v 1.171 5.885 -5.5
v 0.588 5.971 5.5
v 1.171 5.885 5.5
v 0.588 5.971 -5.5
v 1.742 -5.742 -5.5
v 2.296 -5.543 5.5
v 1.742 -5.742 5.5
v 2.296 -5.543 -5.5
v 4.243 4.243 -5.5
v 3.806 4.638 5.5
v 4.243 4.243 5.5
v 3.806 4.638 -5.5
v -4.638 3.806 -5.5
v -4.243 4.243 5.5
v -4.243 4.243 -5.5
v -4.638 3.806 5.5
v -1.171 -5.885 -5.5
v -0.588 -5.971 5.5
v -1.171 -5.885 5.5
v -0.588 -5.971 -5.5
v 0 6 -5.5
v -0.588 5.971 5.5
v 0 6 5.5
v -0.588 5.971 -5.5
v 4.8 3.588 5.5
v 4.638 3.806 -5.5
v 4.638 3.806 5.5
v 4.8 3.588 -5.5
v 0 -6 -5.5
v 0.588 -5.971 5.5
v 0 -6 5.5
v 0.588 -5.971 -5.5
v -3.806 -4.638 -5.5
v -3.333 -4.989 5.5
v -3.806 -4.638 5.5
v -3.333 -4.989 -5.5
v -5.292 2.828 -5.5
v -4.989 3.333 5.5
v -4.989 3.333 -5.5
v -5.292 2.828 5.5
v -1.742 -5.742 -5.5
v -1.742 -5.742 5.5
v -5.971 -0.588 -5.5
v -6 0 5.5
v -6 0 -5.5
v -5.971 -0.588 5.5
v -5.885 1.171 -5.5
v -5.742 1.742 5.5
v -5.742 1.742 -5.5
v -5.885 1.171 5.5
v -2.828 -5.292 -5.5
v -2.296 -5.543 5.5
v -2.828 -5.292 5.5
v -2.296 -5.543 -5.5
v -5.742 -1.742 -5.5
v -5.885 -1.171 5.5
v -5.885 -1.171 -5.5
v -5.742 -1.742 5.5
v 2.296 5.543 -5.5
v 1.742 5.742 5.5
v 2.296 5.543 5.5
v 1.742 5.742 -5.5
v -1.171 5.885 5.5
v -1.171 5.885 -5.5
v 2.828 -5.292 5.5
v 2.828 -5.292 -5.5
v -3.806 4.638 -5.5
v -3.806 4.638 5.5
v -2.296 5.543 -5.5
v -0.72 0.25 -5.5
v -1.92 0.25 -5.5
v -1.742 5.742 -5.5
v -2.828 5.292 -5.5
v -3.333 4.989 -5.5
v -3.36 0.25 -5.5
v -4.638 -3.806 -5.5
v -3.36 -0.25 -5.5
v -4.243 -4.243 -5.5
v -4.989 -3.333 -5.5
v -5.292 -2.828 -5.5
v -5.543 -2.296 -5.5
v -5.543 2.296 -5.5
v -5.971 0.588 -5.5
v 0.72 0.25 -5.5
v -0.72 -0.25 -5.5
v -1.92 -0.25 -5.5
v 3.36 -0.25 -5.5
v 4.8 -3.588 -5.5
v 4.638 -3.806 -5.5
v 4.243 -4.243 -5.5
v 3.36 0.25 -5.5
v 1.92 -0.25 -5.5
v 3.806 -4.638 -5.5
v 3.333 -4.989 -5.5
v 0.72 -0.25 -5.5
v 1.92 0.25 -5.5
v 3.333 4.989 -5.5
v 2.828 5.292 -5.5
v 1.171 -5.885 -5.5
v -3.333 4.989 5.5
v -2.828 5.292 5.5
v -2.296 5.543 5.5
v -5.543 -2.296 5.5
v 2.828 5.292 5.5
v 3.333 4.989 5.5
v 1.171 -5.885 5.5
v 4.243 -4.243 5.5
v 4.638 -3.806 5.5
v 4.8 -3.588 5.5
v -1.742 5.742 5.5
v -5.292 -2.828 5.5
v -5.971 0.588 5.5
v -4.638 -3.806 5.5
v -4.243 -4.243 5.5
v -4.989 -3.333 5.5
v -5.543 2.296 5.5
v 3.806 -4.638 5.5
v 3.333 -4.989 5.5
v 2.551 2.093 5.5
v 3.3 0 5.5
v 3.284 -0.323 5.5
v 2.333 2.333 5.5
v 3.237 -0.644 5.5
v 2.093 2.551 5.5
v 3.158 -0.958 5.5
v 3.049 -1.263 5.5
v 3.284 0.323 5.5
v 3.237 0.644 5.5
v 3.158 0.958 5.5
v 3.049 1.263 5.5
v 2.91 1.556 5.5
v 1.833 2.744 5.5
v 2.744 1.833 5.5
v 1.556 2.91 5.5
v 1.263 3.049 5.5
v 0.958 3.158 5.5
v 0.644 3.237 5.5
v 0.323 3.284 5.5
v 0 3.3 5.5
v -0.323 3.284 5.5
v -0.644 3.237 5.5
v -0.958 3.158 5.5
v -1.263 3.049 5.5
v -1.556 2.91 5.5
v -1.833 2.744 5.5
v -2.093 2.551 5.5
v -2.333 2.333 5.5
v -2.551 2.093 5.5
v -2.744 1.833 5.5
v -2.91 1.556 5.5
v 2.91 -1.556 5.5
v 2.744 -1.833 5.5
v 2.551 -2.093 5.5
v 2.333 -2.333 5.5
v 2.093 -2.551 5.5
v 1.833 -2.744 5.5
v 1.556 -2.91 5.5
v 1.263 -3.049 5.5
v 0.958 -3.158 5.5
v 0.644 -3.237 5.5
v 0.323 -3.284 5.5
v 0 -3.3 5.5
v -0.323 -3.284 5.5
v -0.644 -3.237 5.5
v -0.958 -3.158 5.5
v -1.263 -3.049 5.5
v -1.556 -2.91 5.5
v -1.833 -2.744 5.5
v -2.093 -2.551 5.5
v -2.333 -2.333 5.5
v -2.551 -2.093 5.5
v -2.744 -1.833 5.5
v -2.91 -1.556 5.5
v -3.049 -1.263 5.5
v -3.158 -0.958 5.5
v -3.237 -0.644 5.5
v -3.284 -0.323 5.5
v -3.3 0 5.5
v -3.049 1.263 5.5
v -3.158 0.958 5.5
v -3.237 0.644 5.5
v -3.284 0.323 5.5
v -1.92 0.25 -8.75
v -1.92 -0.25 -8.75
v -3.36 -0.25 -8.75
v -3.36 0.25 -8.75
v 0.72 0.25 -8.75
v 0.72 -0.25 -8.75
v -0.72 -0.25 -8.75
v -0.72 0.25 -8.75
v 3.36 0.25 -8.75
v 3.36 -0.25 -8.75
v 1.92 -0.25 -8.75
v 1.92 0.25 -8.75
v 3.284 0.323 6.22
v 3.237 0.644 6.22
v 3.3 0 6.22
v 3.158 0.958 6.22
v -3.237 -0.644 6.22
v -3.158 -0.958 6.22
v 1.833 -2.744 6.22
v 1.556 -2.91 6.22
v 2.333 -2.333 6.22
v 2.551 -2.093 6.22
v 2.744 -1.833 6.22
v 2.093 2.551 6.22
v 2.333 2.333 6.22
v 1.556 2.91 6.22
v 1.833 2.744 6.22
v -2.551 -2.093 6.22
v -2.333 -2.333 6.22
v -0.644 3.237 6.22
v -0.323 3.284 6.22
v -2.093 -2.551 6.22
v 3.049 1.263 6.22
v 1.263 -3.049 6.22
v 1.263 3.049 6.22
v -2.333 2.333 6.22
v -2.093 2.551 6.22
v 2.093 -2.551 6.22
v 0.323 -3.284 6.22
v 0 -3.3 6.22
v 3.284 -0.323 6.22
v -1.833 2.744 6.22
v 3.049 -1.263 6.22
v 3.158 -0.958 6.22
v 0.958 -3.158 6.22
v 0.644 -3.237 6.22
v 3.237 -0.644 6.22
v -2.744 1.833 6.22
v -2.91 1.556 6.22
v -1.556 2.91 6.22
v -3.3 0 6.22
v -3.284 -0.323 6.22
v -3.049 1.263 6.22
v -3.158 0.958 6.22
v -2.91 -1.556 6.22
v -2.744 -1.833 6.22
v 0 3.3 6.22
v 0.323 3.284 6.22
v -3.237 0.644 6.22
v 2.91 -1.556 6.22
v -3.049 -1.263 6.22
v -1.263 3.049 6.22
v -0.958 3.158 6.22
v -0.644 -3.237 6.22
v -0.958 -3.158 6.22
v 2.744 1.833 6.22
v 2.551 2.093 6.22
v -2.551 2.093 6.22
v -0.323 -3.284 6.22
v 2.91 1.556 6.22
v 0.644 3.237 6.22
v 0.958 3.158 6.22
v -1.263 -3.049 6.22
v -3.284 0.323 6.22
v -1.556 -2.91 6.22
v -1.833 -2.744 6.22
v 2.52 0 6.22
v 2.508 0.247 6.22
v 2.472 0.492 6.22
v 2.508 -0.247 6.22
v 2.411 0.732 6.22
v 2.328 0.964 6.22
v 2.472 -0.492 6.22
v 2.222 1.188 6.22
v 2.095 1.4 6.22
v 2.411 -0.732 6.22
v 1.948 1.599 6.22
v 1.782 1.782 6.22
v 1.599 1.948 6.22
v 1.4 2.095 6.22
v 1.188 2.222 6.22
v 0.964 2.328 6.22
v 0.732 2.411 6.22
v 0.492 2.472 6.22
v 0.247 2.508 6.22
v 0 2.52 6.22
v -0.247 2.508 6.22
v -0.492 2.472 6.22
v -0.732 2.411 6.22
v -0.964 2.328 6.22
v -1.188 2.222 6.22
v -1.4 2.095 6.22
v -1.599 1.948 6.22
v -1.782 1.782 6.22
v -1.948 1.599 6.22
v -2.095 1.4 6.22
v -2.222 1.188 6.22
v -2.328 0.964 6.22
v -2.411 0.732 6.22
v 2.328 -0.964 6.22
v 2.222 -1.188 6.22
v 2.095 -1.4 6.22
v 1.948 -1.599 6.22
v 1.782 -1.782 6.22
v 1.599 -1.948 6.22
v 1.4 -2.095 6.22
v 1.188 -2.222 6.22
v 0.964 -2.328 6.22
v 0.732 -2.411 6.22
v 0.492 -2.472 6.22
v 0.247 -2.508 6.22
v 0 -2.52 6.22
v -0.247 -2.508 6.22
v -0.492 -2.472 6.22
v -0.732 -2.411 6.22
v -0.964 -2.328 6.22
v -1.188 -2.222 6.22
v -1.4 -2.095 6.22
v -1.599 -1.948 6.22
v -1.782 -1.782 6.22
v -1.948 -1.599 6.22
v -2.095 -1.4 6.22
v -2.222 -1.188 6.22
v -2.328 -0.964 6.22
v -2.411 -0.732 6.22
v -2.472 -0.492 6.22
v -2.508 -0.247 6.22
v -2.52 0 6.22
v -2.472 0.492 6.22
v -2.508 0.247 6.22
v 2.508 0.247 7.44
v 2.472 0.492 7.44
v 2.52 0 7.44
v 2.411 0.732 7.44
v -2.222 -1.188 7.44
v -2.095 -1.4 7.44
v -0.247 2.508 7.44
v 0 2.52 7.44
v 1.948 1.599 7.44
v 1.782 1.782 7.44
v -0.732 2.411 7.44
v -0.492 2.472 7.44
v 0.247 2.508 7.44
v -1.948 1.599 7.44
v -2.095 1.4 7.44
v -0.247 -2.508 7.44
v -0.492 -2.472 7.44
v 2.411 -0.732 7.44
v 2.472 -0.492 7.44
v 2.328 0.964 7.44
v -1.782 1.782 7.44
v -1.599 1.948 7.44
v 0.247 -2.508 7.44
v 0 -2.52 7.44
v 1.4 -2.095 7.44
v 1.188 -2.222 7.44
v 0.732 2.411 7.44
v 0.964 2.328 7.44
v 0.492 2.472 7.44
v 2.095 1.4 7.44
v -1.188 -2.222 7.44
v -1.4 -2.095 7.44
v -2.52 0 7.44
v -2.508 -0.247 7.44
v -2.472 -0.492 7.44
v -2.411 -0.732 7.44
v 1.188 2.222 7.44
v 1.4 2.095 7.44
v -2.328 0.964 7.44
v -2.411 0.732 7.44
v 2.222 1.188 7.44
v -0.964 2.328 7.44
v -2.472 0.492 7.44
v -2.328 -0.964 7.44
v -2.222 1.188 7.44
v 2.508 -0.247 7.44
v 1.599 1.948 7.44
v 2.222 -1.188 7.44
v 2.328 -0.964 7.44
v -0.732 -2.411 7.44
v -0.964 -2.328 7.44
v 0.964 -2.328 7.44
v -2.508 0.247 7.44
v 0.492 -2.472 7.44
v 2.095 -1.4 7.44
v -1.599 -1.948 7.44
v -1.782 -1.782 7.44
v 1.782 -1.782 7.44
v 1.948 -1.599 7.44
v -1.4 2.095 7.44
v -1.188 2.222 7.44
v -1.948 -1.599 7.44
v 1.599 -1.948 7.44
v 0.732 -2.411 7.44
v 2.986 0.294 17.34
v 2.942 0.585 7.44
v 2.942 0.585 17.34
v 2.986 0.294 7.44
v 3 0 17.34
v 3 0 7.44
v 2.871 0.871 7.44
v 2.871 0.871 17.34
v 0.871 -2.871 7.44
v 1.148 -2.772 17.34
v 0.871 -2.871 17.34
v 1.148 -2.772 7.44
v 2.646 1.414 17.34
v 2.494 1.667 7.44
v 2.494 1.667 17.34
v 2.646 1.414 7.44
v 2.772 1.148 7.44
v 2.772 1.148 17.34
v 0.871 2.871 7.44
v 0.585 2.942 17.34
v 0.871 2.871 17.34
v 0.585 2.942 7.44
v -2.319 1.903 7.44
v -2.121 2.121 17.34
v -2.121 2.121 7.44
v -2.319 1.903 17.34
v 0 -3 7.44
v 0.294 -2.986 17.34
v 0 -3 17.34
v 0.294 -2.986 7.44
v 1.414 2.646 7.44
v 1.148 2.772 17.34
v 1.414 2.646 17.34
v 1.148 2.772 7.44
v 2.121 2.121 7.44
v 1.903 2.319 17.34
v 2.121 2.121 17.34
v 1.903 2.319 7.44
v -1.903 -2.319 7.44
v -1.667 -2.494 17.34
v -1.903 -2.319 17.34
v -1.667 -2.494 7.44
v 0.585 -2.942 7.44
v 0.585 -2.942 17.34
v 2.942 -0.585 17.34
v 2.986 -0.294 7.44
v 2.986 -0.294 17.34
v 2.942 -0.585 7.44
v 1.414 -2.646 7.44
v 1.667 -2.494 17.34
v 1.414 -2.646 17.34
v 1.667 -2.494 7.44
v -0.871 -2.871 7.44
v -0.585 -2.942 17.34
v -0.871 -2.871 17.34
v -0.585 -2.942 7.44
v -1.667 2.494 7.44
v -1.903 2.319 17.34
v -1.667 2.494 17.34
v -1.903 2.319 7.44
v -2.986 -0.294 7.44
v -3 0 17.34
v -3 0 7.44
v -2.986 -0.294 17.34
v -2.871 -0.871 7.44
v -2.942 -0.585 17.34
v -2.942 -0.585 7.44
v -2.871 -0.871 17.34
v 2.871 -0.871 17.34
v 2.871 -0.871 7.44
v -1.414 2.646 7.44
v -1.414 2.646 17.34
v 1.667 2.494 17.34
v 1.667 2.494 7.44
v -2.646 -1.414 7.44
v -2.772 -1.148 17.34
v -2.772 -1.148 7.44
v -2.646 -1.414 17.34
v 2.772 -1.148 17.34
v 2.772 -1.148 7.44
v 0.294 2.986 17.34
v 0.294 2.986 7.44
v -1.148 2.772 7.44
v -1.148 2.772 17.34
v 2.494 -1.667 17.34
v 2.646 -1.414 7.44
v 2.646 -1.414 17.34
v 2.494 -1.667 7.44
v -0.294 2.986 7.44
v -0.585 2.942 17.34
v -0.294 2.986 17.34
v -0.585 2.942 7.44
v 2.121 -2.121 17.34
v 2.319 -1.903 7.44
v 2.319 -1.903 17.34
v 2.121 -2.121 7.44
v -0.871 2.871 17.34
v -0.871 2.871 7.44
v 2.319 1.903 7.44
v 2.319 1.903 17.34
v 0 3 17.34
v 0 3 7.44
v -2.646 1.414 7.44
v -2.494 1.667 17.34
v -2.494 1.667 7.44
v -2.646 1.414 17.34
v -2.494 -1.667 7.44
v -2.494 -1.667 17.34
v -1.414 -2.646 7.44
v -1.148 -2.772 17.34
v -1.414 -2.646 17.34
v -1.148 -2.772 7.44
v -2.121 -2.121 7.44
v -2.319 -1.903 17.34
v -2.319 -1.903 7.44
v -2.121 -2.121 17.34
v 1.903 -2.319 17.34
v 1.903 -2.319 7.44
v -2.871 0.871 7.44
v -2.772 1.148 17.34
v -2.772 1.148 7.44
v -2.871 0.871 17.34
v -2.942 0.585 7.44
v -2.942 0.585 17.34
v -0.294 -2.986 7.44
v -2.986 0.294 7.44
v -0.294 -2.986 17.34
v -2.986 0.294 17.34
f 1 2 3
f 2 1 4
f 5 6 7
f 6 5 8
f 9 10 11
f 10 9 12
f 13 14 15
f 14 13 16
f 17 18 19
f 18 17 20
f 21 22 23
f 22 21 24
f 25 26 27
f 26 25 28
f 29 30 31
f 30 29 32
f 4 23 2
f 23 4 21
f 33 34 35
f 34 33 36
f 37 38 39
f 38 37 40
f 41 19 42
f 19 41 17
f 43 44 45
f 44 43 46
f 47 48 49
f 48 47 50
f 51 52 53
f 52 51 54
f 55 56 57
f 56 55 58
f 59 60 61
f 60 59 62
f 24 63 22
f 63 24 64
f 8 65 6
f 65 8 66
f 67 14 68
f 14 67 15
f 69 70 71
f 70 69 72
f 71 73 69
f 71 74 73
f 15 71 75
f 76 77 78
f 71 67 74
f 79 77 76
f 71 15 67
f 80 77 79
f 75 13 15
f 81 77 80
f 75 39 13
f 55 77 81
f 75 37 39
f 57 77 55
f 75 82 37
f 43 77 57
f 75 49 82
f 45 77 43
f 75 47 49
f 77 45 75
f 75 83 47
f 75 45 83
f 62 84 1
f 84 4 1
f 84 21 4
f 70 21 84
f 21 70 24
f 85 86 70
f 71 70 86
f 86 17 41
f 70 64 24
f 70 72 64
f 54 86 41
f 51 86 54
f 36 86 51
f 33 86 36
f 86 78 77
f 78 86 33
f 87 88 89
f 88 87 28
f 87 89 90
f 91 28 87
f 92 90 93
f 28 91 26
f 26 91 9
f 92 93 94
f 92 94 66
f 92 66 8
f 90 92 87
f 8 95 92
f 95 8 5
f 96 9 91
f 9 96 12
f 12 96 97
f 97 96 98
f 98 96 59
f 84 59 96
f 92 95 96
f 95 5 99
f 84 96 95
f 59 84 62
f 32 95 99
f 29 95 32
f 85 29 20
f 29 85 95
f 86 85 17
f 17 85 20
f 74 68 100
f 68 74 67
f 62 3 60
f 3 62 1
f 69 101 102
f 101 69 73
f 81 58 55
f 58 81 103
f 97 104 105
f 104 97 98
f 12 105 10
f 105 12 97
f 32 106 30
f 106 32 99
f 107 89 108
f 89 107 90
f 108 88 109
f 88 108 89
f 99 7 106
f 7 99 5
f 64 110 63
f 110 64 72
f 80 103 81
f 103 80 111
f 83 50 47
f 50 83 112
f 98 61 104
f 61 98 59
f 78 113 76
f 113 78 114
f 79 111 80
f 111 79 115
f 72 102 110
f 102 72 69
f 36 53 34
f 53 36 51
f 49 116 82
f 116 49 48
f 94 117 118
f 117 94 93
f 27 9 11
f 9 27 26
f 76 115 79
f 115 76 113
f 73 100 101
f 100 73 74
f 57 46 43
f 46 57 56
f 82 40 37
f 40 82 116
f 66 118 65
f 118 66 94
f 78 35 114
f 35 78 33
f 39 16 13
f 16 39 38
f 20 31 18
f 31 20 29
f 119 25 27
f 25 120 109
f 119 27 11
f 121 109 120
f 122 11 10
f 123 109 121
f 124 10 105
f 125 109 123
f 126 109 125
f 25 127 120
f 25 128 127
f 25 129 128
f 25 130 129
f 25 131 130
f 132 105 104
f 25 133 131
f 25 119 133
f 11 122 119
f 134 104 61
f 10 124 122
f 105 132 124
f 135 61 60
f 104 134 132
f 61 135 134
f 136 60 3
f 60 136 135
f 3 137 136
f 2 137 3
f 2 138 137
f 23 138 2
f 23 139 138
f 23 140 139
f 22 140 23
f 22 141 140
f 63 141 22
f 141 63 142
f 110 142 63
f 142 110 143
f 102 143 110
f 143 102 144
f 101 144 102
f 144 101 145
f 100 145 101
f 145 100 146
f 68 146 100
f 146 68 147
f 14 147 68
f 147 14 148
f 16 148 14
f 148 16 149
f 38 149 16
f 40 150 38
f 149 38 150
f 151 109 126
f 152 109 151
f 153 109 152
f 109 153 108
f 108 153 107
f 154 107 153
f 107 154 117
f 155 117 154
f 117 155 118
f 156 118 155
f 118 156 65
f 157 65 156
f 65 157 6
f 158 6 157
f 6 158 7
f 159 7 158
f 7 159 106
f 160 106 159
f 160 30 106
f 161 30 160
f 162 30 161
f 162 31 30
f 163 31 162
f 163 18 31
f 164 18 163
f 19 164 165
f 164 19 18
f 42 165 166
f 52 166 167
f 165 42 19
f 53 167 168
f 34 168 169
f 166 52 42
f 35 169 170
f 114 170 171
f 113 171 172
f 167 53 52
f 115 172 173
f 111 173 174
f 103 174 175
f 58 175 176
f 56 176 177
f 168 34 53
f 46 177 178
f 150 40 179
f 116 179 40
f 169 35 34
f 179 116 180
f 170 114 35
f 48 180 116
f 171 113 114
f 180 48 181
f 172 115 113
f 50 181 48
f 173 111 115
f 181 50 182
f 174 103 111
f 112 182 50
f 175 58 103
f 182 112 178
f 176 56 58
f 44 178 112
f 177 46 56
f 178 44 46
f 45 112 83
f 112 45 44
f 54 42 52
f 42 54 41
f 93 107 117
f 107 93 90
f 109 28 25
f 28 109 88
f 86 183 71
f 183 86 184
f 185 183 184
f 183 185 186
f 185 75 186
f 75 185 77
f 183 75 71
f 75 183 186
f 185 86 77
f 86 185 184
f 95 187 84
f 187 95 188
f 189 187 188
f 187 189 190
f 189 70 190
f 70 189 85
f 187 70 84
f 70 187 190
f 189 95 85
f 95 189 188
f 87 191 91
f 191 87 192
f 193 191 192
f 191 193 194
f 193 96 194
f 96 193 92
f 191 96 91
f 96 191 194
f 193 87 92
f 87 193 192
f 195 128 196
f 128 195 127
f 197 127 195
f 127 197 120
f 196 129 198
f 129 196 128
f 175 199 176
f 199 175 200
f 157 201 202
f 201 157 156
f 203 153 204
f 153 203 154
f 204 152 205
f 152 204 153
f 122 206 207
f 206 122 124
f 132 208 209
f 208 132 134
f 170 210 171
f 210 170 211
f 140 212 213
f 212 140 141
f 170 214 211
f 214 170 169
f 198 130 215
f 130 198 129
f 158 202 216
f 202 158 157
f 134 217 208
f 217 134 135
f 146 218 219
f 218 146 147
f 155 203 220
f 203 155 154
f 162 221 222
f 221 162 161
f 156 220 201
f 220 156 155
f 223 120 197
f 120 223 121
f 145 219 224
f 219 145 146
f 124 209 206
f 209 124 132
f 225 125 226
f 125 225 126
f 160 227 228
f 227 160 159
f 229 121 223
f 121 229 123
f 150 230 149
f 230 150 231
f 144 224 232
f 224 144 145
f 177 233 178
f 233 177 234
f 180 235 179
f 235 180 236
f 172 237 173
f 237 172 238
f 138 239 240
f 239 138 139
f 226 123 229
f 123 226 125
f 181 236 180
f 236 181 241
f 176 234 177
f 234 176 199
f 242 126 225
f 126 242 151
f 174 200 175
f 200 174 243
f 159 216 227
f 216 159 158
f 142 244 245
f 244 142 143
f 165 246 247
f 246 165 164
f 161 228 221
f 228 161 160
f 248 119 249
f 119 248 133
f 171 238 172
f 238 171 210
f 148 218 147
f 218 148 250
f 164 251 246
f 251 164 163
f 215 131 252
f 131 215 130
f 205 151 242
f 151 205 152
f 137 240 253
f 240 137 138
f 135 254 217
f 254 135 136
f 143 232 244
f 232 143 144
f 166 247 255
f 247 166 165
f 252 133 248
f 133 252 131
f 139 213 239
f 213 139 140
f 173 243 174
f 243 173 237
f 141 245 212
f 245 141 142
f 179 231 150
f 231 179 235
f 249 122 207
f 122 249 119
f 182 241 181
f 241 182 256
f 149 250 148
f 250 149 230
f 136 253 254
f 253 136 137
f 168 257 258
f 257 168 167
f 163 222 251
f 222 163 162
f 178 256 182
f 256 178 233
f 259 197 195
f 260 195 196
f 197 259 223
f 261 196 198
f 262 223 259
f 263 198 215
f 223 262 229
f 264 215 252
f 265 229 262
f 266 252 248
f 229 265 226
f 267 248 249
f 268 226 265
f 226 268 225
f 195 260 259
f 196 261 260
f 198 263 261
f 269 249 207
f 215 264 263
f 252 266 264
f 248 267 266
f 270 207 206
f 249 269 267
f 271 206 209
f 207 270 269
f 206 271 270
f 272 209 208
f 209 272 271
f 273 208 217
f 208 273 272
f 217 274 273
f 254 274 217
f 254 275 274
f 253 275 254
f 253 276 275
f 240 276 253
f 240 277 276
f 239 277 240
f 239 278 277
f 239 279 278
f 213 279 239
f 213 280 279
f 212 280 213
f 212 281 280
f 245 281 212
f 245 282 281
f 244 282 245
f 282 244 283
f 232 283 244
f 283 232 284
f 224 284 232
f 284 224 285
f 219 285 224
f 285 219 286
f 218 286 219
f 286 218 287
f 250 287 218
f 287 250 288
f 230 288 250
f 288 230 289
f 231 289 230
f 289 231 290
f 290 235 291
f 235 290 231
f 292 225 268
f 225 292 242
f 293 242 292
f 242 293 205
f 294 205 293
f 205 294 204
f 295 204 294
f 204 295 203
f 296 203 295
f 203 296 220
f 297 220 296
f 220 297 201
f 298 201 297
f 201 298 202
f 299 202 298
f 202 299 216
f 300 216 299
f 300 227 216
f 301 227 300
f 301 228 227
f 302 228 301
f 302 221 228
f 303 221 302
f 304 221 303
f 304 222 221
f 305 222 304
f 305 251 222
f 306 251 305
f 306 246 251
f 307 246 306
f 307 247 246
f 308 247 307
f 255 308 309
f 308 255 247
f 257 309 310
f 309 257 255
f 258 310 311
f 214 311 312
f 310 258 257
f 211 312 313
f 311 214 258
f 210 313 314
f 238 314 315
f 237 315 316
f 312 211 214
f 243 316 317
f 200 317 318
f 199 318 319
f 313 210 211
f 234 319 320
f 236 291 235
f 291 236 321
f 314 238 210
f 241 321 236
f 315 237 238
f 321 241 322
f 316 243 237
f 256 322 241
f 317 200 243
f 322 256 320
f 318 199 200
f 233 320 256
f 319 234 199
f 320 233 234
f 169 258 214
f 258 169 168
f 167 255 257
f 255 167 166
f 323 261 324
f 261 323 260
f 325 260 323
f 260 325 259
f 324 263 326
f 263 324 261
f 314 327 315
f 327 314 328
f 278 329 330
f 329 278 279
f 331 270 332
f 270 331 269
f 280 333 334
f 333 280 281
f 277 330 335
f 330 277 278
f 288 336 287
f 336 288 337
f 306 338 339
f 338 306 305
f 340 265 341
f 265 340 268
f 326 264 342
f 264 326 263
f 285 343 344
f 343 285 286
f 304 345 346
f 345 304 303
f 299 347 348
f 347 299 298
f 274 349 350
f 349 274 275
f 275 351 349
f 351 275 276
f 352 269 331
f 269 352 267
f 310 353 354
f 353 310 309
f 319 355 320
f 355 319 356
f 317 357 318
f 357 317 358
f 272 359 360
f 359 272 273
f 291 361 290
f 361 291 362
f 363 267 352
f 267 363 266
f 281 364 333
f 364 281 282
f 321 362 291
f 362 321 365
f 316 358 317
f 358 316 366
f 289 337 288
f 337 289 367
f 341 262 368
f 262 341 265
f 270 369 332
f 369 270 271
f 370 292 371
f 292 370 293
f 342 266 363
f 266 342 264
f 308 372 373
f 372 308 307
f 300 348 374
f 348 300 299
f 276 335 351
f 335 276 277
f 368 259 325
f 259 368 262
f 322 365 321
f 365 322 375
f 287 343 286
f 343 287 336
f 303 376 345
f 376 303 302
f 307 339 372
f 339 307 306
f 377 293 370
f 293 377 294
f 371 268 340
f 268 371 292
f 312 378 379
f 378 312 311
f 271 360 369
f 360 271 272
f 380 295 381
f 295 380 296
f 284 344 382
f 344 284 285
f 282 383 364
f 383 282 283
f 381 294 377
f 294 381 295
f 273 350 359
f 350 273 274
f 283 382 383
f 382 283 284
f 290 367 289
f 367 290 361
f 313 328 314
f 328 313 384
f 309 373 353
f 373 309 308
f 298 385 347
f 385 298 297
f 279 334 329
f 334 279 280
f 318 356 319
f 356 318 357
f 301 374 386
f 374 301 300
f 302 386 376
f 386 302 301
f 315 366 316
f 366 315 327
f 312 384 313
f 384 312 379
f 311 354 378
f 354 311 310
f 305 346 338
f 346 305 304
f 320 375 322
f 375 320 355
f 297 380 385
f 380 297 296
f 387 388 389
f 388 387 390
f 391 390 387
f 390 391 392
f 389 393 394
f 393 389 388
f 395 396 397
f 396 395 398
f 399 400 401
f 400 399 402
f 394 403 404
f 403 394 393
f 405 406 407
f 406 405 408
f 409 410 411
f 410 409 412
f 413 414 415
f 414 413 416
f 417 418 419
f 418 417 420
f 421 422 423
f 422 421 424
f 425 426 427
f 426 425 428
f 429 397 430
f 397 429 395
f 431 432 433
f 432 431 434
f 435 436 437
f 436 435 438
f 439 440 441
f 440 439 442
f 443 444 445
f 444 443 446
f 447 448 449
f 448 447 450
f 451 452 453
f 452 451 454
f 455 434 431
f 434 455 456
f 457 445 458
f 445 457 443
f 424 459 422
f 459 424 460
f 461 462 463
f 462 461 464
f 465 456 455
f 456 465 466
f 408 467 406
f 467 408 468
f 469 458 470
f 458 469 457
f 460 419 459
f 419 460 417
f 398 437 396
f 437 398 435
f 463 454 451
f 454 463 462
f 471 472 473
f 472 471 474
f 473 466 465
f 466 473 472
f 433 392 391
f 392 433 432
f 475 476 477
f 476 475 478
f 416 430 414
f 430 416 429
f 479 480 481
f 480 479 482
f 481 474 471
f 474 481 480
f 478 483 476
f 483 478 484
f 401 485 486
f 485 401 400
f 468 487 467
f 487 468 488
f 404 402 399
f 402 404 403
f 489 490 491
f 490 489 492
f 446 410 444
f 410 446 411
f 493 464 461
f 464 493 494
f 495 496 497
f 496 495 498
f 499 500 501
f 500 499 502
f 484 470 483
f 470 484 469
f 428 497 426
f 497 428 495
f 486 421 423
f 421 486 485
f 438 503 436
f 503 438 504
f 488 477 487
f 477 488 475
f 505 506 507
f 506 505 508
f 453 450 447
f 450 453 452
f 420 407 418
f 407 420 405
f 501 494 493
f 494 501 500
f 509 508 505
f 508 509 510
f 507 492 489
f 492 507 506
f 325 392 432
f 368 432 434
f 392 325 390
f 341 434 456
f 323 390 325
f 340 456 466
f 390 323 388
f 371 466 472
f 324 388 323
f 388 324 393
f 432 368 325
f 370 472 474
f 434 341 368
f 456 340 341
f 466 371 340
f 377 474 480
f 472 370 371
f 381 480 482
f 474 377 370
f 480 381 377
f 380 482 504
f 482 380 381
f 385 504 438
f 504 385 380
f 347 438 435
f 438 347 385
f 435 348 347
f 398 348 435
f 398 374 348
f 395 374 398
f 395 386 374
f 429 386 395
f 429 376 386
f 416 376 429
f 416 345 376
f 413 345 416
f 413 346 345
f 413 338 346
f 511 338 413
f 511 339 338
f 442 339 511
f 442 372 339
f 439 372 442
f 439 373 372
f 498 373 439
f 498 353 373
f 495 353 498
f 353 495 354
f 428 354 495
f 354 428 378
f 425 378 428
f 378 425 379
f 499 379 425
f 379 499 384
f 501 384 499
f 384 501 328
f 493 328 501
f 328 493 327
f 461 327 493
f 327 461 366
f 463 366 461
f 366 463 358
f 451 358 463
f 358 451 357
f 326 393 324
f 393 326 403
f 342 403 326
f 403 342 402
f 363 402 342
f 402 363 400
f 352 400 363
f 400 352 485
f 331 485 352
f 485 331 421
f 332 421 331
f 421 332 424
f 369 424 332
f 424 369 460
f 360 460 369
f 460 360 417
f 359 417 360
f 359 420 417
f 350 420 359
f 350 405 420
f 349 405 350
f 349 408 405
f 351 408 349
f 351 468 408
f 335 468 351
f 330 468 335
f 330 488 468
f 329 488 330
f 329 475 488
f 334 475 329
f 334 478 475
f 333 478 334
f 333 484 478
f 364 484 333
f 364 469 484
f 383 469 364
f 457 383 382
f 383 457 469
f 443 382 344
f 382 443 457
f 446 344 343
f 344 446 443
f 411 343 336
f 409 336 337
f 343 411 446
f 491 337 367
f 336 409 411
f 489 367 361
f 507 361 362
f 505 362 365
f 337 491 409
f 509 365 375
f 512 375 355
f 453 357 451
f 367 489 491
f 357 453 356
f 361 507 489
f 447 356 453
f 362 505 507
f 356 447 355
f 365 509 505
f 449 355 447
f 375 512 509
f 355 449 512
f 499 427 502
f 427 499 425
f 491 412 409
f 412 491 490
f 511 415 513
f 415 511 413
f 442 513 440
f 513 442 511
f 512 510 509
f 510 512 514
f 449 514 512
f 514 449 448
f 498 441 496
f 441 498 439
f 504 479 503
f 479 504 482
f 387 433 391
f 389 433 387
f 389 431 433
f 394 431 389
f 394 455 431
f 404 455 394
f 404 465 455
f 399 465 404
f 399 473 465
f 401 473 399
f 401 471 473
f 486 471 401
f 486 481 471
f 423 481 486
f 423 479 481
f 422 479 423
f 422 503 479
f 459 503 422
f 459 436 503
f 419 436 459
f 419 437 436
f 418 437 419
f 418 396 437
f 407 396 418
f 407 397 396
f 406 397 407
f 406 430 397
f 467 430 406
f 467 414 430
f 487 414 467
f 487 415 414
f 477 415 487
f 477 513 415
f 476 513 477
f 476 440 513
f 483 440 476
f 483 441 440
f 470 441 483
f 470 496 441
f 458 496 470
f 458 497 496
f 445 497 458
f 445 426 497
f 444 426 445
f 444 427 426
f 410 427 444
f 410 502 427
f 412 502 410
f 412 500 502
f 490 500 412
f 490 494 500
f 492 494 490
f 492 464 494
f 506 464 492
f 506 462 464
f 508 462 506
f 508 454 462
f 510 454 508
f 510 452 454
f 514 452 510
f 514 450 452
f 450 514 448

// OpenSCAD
// Potentiometer: [12, 11, 6, 0.5]
// One connected solid, with cylindrical body + bushing + shaft + 3 terminals

type_0 = 12; //[6:24:1]
type_1 = 11; //[6:22:1]
type_2 = 6;  //[3:12:1]
type_3 = 0.5; //[0.25:1:0.05]

$fn = 64;

// ---- Derived dimensions (scaled from the 4-tuple) ----
body_d      = type_0;          // main can diameter
body_h      = type_1;          // main can height
shaft_d     = type_2;          // shaft diameter
pin_t       = type_3;          // terminal thickness

eps = max(0.2, pin_t*0.6);
overlap = max(0.4, pin_t*1.2);

// Bushing / boss
boss_d    = body_d * 0.55;
boss_h    = max(1.2, body_h * 0.12);

bushing_d = body_d * 0.42;
bushing_h = max(2.0, body_h * 0.22);

// Shaft
shaft_h   = max(8, body_h * 0.9);

// Terminals (3 pins)
pin_w     = max(pin_t*2.2, body_d*0.12);
pin_h     = max(3.0, body_h*0.35);
pin_pitch = body_d * 0.22;

// Small flat on body to suggest typical pot can
flat_depth = body_d * 0.10;

// ---- Geometry ----
module potentiometer() {
    union() {
        // Main cylindrical housing with a small flat (difference keeps it one solid via union at top level)
        difference() {
            cylinder(d=body_d, h=body_h, center=true);
            // Flat cut on one side (creates D-like can)
            translate([body_d/2 - flat_depth/2, 0, 0])
                cube([flat_depth, body_d*1.2, body_h*1.2], center=true);
        }

        // Boss (connected to top of body)
        translate([0, 0, body_h/2 + boss_h/2 - overlap])
            cylinder(d=boss_d, h=boss_h, center=true);

        // Threaded bushing (connected to boss)
        translate([0, 0, body_h/2 + boss_h - overlap + bushing_h/2 - overlap])
            cylinder(d=bushing_d, h=bushing_h, center=true);

        // Shaft (connected to bushing)
        translate([0, 0, body_h/2 + boss_h + bushing_h - 2*overlap + shaft_h/2 - overlap])
            cylinder(d=shaft_d, h=shaft_h, center=true);

        // Terminals/pins (connected to bottom of body)
        for (i = [-1, 0, 1]) {
            translate([i*pin_pitch, 0, -body_h/2 - pin_h/2 + overlap])
                cube([pin_w, pin_t, pin_h], center=true);
        }

        // Small base tab tying pins together (ensures robust connectivity)
        translate([0, 0, -body_h/2 - pin_t/2 + overlap])
            cube([pin_pitch*2 + pin_w, pin_t*1.2, pin_t], center=true);
    }
}

potentiometer();
